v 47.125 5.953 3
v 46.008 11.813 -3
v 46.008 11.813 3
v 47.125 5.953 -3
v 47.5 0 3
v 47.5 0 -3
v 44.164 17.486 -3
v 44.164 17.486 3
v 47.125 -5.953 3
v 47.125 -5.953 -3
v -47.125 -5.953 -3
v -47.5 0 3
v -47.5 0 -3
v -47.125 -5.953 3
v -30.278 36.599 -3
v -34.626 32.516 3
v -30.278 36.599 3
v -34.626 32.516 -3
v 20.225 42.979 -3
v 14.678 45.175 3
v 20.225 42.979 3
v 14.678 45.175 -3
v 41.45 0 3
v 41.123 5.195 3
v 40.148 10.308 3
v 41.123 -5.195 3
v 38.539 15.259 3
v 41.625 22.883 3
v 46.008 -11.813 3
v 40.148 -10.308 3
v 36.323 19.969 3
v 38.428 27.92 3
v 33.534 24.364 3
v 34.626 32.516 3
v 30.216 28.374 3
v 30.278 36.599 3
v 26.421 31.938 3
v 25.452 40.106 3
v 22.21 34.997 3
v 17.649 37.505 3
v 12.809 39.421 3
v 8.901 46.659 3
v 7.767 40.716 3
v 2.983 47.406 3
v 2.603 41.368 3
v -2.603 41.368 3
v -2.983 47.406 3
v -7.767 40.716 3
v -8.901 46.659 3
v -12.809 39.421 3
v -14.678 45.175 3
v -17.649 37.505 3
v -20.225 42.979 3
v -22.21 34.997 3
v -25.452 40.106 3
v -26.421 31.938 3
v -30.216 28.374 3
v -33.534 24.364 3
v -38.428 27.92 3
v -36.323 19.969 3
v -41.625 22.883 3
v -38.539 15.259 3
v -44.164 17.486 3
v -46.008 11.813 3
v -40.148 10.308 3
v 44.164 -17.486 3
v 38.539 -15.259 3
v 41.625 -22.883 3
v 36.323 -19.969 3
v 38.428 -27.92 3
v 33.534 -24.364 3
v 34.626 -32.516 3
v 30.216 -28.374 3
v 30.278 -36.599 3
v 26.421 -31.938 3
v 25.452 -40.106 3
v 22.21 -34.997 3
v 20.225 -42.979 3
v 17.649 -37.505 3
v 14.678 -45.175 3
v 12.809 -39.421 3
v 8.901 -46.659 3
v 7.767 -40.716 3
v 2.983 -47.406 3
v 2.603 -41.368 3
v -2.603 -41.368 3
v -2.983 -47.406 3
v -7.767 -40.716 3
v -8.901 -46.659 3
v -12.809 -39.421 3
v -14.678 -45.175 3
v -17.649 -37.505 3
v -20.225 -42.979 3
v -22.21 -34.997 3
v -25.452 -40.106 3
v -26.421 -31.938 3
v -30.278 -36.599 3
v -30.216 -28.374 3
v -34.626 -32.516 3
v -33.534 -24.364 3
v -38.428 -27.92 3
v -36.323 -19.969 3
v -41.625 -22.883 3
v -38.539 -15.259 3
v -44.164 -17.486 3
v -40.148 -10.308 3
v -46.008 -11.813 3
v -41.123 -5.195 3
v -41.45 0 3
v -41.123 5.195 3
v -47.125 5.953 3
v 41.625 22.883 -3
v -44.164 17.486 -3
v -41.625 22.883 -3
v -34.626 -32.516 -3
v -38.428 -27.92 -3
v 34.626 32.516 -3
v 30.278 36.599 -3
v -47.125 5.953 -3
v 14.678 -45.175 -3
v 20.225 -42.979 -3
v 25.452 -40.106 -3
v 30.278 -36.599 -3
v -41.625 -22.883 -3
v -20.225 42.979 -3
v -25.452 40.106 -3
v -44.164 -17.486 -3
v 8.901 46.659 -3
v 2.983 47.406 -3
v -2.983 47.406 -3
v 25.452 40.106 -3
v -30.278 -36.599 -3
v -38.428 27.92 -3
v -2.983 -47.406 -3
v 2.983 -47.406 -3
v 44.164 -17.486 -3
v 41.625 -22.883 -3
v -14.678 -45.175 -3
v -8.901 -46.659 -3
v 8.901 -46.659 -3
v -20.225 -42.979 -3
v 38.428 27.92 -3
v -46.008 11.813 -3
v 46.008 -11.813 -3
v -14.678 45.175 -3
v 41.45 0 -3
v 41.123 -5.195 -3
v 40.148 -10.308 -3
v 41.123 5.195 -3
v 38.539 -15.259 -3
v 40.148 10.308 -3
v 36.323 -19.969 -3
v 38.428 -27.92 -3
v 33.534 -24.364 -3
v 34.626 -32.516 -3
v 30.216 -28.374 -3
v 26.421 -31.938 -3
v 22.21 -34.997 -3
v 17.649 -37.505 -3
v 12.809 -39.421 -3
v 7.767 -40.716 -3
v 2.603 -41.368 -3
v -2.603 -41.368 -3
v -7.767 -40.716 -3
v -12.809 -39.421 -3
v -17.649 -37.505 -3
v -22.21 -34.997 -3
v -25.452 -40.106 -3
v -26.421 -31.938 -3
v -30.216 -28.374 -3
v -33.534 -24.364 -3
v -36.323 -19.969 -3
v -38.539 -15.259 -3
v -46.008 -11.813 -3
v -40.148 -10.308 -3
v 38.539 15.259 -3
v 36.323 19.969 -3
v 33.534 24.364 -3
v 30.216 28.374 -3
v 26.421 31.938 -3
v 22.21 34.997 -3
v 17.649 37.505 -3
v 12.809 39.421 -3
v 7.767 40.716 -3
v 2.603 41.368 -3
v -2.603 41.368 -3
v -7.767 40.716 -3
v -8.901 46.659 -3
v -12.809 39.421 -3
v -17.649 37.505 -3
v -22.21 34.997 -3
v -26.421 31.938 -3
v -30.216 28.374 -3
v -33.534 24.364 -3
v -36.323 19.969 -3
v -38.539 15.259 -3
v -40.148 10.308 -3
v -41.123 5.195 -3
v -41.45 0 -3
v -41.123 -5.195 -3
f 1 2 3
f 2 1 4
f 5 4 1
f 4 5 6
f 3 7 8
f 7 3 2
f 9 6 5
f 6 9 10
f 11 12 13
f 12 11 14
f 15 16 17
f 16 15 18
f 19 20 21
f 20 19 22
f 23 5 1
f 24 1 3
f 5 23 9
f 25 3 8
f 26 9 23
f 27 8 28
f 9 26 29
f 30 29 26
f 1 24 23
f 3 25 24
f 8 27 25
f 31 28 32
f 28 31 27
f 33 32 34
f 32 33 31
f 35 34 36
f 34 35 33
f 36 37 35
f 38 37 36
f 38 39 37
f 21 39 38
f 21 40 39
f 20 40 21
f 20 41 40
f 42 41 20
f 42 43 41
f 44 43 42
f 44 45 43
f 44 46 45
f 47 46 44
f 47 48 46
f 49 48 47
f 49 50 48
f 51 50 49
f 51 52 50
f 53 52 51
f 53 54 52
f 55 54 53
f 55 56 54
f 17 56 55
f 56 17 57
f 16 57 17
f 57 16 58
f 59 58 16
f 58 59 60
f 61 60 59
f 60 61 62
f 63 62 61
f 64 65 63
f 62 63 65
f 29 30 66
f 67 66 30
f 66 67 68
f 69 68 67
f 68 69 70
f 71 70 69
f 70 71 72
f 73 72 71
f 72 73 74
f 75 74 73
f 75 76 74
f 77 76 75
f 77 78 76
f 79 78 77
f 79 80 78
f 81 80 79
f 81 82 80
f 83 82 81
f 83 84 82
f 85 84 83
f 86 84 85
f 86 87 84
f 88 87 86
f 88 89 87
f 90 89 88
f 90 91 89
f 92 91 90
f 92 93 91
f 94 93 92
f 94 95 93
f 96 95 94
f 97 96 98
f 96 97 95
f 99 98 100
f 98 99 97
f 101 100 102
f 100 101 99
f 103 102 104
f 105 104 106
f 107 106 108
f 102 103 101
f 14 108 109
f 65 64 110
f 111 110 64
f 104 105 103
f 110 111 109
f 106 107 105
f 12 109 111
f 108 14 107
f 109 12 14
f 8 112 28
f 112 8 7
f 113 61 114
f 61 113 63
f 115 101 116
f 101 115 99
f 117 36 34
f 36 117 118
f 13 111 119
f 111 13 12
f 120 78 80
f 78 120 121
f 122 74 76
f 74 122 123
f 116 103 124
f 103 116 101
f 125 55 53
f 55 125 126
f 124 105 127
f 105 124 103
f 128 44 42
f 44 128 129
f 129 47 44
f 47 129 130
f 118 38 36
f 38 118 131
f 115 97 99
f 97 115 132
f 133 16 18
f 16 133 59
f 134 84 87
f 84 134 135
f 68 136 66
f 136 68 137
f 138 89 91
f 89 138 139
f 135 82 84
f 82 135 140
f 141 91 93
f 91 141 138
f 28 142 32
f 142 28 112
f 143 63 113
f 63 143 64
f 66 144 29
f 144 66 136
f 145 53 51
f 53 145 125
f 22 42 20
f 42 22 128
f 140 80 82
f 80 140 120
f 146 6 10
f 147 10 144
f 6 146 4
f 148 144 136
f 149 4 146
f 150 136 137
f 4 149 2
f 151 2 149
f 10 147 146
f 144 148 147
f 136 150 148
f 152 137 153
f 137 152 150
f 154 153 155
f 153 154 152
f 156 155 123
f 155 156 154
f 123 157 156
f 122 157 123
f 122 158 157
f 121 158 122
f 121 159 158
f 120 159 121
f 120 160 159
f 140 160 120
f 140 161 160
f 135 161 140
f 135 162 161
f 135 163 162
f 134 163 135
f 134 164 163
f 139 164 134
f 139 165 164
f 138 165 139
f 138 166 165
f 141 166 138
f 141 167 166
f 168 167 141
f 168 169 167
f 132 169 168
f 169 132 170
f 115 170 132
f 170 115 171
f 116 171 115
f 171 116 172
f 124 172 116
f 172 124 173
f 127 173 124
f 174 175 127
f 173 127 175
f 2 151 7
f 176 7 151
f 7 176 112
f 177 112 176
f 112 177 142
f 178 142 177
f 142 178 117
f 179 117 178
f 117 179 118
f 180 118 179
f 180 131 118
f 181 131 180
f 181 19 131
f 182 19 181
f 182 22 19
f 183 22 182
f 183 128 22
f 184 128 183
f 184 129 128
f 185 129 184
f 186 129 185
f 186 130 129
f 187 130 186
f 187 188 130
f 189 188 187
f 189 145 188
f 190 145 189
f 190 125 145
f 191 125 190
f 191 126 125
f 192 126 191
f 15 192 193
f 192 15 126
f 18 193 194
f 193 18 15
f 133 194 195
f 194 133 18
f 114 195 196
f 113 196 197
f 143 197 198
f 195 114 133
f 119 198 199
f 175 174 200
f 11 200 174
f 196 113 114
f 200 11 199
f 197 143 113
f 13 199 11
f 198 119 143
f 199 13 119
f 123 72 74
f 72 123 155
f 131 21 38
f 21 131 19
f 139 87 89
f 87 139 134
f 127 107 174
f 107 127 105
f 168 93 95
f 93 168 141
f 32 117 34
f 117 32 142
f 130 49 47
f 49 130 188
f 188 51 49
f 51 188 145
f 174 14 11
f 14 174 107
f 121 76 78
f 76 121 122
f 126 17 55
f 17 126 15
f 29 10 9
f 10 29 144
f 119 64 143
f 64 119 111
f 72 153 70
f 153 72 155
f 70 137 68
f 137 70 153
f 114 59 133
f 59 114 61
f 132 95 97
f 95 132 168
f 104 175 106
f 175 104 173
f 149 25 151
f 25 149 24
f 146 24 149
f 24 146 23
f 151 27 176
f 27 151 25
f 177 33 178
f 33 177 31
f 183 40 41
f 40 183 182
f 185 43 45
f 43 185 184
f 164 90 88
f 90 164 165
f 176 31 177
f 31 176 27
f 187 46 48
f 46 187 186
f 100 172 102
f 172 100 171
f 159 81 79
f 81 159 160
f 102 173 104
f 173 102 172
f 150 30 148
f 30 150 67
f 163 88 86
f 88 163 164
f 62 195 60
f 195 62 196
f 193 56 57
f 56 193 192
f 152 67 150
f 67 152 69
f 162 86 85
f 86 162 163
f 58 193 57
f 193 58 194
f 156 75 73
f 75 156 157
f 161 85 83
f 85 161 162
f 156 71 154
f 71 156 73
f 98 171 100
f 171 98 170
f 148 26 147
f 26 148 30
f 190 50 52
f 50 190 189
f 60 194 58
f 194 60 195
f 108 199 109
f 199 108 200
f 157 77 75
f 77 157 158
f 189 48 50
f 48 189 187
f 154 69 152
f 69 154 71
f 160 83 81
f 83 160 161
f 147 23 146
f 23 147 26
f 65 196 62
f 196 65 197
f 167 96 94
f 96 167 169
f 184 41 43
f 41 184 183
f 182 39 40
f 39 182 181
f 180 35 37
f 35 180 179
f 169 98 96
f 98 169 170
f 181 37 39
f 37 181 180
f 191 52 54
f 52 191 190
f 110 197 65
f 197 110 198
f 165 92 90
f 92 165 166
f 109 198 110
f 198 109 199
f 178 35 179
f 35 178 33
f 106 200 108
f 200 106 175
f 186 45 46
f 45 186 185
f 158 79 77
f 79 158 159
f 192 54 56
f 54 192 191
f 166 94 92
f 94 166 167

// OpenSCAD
// This is a primer tray spacer. It makes adapts my primer tray funnel to larger primer trays.
//
// Warning -- some sanding and fitting may be required.
//
// This is licensed under the creative commons+attribution license
//
// To fulfil the attribution requirement, please link to:
// http://www.thingiverse.com/thing:2190725

/* [Main] */

// Define number of facets (large numbers provide better smoothing)
$fn=50;

// Define outside diameter of spacer ring in mm
outside_diameter=95.0;

// Define inside diameter of the spacer ring in mm
inside_diameter=82.9;

// Define height of spacer ring in mm
spacer_height=6.0;

module spacer_ring()
{
	difference()
	{
		cylinder(h=spacer_height,r=outside_diameter/2,center=true);
		cylinder(h=spacer_height+1,r=inside_diameter/2,center=true);
	}
	
}

spacer_ring();
